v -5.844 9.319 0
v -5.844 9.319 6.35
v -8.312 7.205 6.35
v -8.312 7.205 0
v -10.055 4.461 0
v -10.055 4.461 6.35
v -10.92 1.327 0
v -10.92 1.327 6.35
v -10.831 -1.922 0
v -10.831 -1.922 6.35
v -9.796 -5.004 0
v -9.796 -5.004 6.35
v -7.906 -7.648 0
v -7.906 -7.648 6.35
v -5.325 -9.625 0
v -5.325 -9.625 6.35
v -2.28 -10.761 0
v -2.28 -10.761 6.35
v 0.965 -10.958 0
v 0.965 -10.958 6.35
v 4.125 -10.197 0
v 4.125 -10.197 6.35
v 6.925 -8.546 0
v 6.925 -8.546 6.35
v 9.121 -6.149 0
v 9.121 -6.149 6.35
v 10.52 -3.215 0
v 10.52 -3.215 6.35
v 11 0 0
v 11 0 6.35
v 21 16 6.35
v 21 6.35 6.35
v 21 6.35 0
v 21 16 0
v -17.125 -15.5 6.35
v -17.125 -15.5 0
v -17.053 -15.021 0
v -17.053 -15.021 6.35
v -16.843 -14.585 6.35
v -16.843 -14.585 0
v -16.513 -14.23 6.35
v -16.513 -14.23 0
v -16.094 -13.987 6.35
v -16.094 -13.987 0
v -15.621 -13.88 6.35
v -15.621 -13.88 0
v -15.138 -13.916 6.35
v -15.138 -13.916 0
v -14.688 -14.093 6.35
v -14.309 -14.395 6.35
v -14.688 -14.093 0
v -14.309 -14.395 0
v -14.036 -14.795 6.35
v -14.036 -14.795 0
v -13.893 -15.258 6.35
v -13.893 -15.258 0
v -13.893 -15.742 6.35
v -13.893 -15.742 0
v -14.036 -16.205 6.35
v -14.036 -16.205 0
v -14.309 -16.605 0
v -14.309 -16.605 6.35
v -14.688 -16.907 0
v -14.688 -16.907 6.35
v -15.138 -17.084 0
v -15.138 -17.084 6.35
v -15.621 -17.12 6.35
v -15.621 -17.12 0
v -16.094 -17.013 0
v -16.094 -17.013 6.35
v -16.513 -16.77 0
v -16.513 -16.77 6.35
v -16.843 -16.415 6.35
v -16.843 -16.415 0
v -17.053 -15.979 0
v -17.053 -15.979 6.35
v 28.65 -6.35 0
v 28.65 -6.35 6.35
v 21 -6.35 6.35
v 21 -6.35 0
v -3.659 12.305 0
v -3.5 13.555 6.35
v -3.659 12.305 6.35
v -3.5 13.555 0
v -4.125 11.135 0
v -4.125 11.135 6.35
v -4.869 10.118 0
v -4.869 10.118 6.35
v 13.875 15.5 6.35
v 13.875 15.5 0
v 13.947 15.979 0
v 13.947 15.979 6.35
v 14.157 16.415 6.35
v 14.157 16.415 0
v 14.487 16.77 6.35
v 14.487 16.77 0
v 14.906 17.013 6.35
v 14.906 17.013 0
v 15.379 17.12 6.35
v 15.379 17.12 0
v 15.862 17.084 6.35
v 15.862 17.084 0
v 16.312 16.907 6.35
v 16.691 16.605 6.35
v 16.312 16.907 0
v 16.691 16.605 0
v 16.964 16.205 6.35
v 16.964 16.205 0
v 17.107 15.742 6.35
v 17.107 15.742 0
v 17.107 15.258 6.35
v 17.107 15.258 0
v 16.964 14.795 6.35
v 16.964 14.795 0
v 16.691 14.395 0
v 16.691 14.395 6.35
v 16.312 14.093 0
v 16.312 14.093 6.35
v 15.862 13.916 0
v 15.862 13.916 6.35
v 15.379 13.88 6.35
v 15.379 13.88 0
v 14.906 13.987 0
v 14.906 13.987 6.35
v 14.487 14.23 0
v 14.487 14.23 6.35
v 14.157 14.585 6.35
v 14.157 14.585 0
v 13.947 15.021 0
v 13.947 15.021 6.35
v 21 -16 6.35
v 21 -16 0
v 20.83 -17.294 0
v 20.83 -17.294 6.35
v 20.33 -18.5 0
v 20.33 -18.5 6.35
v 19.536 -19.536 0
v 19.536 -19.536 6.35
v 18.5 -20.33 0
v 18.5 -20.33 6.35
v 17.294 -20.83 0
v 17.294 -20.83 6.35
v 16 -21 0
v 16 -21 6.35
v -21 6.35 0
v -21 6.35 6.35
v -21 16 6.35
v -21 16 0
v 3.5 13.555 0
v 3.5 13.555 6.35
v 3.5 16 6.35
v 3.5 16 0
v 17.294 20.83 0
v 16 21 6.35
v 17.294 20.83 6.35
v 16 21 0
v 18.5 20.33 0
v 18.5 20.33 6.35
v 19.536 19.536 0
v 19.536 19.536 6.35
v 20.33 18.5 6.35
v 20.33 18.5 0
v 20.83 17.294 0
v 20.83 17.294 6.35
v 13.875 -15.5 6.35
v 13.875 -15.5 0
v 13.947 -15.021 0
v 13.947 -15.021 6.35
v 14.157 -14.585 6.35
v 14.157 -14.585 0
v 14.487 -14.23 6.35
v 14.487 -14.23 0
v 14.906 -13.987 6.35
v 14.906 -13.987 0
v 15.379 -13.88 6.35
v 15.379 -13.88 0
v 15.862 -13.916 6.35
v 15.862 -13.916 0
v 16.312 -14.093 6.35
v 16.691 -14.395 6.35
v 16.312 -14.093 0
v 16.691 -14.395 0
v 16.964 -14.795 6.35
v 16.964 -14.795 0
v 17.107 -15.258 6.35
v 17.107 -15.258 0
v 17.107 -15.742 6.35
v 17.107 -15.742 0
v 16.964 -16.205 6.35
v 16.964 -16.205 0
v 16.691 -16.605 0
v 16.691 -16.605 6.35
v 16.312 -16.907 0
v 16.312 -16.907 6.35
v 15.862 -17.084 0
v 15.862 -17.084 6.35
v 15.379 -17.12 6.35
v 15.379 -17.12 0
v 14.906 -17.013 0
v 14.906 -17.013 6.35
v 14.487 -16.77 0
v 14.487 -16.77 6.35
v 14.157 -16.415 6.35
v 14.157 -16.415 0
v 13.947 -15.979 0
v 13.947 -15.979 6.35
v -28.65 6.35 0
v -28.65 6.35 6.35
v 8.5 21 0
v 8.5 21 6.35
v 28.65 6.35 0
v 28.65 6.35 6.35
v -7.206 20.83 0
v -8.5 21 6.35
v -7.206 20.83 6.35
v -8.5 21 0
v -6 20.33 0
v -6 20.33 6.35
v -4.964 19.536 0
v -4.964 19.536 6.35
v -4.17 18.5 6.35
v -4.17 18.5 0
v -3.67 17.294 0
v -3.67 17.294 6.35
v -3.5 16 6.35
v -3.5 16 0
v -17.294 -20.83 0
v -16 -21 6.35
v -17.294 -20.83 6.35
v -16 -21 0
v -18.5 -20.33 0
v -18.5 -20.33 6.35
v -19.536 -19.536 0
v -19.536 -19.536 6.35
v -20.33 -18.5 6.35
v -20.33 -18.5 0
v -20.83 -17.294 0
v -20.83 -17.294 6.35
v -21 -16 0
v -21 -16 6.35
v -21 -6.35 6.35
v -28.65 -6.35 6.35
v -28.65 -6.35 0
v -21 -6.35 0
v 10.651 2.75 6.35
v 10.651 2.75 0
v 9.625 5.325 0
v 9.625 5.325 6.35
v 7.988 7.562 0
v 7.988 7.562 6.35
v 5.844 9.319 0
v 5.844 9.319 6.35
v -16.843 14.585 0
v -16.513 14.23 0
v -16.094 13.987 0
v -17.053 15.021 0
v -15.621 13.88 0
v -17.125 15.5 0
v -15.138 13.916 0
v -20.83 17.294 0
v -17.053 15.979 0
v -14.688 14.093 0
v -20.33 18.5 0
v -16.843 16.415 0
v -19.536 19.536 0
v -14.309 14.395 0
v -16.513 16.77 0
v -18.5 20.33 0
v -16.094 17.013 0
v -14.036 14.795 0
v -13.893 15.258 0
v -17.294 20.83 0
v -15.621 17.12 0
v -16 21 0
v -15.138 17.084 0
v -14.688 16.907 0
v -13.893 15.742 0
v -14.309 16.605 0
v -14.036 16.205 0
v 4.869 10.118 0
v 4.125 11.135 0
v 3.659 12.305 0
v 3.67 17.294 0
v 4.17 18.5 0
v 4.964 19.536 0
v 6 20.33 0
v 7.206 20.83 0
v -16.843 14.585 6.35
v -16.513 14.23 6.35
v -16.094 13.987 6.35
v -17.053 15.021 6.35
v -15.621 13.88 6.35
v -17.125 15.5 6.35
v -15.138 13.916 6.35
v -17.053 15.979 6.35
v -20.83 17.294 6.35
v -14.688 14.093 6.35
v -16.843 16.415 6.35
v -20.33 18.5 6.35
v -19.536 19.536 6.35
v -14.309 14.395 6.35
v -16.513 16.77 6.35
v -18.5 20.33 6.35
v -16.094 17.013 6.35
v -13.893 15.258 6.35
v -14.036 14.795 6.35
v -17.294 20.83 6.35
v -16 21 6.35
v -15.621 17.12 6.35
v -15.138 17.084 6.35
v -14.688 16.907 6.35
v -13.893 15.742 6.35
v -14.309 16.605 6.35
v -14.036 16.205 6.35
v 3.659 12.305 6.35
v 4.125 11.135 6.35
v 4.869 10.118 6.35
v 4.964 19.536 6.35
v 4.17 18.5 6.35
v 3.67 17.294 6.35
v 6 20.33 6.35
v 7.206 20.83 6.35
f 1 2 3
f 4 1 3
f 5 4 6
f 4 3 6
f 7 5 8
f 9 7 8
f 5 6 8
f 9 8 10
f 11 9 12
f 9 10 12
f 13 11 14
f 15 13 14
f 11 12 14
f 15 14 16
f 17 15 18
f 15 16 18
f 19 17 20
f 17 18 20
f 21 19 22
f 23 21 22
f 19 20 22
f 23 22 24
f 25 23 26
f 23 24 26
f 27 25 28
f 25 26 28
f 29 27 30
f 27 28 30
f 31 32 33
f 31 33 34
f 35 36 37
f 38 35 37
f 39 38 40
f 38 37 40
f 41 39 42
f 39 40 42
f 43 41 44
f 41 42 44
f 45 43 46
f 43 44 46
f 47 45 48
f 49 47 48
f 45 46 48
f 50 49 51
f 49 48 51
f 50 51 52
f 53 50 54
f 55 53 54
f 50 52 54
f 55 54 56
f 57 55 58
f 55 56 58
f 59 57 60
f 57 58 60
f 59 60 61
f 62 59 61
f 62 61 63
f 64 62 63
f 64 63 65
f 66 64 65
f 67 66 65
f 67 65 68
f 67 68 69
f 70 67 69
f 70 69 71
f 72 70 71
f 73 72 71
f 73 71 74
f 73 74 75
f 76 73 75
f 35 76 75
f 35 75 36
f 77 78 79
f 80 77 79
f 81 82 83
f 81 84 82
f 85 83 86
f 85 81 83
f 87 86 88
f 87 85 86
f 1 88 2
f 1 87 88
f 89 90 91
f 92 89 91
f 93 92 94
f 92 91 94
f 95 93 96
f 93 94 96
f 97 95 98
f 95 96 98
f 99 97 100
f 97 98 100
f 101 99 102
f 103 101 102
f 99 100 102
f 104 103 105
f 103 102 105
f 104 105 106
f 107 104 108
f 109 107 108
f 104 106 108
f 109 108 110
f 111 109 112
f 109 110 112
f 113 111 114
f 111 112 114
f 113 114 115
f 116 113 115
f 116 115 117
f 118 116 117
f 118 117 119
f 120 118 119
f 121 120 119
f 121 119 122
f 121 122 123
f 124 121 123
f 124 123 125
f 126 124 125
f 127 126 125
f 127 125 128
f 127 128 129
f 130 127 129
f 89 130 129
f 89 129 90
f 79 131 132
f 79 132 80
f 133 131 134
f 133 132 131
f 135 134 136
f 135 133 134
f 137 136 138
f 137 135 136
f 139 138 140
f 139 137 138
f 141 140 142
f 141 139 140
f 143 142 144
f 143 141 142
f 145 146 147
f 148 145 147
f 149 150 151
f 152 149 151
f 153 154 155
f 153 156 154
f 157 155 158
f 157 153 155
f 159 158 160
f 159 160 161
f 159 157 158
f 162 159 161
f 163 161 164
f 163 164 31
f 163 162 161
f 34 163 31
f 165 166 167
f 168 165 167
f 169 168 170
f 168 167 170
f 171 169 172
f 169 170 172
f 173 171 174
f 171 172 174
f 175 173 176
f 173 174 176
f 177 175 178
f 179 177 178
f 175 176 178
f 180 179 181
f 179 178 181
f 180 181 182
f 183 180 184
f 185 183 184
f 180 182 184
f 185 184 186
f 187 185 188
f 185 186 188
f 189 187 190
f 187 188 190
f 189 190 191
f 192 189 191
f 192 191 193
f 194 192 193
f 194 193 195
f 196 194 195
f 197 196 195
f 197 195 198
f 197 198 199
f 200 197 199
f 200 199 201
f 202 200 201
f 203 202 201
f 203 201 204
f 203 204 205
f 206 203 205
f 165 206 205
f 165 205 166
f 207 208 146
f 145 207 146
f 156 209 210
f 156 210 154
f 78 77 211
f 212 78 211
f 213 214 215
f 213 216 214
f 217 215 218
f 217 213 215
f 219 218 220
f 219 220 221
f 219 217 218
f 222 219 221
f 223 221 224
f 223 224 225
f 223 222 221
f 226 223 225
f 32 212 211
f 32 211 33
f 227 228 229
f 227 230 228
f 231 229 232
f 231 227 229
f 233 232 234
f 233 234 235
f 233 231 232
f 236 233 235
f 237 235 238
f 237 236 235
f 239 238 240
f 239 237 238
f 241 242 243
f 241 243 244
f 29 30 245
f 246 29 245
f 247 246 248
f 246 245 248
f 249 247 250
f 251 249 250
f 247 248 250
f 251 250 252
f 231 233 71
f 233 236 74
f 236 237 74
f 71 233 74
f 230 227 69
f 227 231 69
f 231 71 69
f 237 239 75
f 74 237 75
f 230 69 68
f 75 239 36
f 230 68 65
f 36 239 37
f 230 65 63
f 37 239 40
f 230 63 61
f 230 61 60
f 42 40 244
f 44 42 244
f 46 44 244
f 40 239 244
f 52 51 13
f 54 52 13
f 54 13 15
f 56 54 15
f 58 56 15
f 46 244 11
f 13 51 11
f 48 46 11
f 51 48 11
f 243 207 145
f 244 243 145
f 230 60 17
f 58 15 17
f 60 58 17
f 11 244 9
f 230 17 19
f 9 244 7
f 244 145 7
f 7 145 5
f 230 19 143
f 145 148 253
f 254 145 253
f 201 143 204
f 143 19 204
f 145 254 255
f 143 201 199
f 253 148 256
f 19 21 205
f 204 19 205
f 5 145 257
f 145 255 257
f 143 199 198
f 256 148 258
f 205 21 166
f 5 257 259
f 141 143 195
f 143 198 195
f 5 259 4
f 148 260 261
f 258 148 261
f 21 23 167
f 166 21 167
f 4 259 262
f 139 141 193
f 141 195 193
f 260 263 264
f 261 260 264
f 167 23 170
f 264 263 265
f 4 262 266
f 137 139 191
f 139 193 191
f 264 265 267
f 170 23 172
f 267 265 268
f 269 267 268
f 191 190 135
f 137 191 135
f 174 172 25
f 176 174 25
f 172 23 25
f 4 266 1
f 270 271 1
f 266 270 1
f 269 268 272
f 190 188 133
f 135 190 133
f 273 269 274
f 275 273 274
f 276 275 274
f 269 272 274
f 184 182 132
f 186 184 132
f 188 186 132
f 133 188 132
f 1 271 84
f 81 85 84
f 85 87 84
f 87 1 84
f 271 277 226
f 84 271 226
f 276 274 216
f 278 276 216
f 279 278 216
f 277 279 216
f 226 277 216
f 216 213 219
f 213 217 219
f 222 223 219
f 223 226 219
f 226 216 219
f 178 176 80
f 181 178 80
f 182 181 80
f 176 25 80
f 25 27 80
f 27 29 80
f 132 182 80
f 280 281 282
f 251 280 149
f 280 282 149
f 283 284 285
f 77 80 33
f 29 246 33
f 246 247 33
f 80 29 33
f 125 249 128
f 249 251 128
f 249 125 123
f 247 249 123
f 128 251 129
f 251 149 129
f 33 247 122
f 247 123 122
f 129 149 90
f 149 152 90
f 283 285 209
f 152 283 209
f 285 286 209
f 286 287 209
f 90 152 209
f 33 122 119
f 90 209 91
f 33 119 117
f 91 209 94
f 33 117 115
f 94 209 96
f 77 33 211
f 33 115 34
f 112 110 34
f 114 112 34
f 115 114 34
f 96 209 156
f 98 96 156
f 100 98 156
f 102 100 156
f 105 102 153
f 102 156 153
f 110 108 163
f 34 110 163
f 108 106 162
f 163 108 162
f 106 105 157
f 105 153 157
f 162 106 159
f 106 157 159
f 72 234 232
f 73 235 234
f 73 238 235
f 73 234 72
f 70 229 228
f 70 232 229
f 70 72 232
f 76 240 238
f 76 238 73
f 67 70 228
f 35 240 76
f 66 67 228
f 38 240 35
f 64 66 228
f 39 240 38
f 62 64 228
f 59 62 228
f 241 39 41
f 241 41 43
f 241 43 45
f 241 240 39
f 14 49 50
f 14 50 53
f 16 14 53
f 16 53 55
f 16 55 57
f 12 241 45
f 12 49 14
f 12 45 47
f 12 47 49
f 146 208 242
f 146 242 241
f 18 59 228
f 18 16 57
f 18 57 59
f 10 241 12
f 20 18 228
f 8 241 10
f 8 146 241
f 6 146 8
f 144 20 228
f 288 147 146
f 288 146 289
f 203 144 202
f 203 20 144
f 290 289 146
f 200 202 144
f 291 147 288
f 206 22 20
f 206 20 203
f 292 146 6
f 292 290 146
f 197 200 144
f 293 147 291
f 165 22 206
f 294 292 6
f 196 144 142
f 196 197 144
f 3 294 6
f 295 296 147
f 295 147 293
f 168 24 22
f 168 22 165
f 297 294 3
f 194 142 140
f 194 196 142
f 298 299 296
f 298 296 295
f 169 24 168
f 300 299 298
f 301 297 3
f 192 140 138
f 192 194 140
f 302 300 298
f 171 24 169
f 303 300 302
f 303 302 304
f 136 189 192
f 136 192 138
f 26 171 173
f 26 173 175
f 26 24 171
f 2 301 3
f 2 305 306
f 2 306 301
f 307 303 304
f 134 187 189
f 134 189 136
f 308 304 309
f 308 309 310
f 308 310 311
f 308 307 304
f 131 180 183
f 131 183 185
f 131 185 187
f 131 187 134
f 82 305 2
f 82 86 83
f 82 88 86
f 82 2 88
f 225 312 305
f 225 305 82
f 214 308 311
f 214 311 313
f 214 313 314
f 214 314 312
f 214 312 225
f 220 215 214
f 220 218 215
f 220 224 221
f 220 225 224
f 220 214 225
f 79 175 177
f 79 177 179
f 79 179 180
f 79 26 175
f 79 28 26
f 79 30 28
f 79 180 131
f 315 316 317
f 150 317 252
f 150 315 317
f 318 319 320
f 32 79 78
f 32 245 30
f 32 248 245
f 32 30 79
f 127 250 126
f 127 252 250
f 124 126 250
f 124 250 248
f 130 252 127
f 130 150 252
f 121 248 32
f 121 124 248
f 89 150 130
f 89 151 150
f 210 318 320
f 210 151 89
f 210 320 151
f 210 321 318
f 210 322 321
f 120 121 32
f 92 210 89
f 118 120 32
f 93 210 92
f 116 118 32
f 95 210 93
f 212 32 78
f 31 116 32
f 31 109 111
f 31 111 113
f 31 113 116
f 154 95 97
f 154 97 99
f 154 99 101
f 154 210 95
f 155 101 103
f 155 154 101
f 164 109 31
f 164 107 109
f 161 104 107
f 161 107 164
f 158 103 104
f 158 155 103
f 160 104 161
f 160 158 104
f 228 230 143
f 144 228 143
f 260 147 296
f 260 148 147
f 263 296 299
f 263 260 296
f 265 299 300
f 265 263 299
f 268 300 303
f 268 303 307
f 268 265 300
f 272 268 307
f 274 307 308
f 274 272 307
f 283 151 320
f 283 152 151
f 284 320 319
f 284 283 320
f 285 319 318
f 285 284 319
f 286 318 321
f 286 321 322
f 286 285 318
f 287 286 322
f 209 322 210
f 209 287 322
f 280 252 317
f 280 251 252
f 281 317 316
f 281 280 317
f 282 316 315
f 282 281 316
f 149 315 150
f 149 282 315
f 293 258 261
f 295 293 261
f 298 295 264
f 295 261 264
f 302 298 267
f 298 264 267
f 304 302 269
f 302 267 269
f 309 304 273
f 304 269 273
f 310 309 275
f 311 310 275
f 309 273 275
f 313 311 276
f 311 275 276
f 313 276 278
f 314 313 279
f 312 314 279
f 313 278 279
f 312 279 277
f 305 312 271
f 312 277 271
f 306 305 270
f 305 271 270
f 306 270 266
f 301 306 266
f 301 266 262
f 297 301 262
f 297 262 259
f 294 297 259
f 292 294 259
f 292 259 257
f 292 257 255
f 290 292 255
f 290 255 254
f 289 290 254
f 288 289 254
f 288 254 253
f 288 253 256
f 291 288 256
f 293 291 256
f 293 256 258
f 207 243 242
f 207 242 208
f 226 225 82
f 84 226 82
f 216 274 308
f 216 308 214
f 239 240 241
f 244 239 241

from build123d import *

# Parameters (mm, degrees)
SKETCH1_W                   = 57.3
SKETCH1_H                   = 42
BOSS_EXTRUDE1_DEPTH         = 6.35
TAP_DRILL_FOR_M3X0_5_TAP1_D = 3.25
CUT_EXTRUDE1_DEPTH          = 37.085246293
SKETCH5_W                   = 7.65
SKETCH5_H                   = 14.65
CUT_EXTRUDE2_DEPTH          = 37.085246293
FILLET1_R                   = 5


with BuildPart() as part:
    # Sketch1 → Boss-Extrude1 (new body)
    with BuildSketch(Plane.XY):
        Rectangle(SKETCH1_W, SKETCH1_H)
    extrude(amount=BOSS_EXTRUDE1_DEPTH)

    # Tap Drill for M3x0.5 Tap1 (through all)
    with Locations(Plane.XY.offset(6.35)):
        with Locations((15.5, 15.5), (15.5, -15.5), (-15.5, 15.5), (-15.5, -15.5)):
            Hole(TAP_DRILL_FOR_M3X0_5_TAP1_D / 2)

    # Sketch4 → Cut-Extrude1 (cut, through all)
    with BuildSketch(Plane.XY.offset(6.35)):
        with BuildLine():
            ThreePointArc((11, 0), (8.93028555, 6.422616289), (3.5, 10.428326807))
            Line((3.5, 10.428326807), (-3.5, 10.428326807))
            ThreePointArc((-3.5, 10.428326807), (-6.422616289, -8.93028555), (11, 0))
        make_face()
        with BuildLine():
            Line((-3.5, 10.428326807), (3.5, 10.428326807))
            ThreePointArc((3.5, 10.428326807), (0, 11), (-3.5, 10.428326807))
        make_face()
        with BuildLine():
            ThreePointArc((-3.5, 10.428326807), (0, 11), (3.5, 10.428326807))
            Line((3.5, 10.428326807), (3.5, 21))
            Line((3.5, 21), (-3.5, 21))
            Line((-3.5, 21), (-3.5, 10.428326807))
        make_face()
    extrude(amount=-CUT_EXTRUDE1_DEPTH, mode=Mode.SUBTRACT)

    # Sketch5 → Cut-Extrude2 (cut, through all)
    with BuildSketch(Plane.XY.offset(6.35)):
        with Locations((-24.825, 13.675)):
            Rectangle(SKETCH5_W, SKETCH5_H)
        with Locations((-24.825, -13.675)):
            Rectangle(SKETCH5_W, SKETCH5_H)
    cut_extrude2 = extrude(amount=-CUT_EXTRUDE2_DEPTH, mode=Mode.SUBTRACT)

    # Mirror1: Cut-Extrude2 across plane
    add(cut_extrude2.mirror(Plane(origin=(0, 0, 0), x_dir=(0, 0, 1), z_dir=(1, 0, 0))), mode=Mode.SUBTRACT)

    # Fillet1
    fillet1_edges = [part.edges().sort_by_distance(p)[0] for p in [
        (3.5, 10.428326807, 3.175),
        (-3.5, 10.428326807, 3.175),
        (-3.5, 21, 3.175),
        (3.5, 21, 3.175),
        (-21, 21, 3.175),
        (-21, -21, 3.175),
        (21, 21, 3.175),
        (21, -21, 3.175),
    ]]
    fillet(fillet1_edges, radius=FILLET1_R)


solid = part.part
